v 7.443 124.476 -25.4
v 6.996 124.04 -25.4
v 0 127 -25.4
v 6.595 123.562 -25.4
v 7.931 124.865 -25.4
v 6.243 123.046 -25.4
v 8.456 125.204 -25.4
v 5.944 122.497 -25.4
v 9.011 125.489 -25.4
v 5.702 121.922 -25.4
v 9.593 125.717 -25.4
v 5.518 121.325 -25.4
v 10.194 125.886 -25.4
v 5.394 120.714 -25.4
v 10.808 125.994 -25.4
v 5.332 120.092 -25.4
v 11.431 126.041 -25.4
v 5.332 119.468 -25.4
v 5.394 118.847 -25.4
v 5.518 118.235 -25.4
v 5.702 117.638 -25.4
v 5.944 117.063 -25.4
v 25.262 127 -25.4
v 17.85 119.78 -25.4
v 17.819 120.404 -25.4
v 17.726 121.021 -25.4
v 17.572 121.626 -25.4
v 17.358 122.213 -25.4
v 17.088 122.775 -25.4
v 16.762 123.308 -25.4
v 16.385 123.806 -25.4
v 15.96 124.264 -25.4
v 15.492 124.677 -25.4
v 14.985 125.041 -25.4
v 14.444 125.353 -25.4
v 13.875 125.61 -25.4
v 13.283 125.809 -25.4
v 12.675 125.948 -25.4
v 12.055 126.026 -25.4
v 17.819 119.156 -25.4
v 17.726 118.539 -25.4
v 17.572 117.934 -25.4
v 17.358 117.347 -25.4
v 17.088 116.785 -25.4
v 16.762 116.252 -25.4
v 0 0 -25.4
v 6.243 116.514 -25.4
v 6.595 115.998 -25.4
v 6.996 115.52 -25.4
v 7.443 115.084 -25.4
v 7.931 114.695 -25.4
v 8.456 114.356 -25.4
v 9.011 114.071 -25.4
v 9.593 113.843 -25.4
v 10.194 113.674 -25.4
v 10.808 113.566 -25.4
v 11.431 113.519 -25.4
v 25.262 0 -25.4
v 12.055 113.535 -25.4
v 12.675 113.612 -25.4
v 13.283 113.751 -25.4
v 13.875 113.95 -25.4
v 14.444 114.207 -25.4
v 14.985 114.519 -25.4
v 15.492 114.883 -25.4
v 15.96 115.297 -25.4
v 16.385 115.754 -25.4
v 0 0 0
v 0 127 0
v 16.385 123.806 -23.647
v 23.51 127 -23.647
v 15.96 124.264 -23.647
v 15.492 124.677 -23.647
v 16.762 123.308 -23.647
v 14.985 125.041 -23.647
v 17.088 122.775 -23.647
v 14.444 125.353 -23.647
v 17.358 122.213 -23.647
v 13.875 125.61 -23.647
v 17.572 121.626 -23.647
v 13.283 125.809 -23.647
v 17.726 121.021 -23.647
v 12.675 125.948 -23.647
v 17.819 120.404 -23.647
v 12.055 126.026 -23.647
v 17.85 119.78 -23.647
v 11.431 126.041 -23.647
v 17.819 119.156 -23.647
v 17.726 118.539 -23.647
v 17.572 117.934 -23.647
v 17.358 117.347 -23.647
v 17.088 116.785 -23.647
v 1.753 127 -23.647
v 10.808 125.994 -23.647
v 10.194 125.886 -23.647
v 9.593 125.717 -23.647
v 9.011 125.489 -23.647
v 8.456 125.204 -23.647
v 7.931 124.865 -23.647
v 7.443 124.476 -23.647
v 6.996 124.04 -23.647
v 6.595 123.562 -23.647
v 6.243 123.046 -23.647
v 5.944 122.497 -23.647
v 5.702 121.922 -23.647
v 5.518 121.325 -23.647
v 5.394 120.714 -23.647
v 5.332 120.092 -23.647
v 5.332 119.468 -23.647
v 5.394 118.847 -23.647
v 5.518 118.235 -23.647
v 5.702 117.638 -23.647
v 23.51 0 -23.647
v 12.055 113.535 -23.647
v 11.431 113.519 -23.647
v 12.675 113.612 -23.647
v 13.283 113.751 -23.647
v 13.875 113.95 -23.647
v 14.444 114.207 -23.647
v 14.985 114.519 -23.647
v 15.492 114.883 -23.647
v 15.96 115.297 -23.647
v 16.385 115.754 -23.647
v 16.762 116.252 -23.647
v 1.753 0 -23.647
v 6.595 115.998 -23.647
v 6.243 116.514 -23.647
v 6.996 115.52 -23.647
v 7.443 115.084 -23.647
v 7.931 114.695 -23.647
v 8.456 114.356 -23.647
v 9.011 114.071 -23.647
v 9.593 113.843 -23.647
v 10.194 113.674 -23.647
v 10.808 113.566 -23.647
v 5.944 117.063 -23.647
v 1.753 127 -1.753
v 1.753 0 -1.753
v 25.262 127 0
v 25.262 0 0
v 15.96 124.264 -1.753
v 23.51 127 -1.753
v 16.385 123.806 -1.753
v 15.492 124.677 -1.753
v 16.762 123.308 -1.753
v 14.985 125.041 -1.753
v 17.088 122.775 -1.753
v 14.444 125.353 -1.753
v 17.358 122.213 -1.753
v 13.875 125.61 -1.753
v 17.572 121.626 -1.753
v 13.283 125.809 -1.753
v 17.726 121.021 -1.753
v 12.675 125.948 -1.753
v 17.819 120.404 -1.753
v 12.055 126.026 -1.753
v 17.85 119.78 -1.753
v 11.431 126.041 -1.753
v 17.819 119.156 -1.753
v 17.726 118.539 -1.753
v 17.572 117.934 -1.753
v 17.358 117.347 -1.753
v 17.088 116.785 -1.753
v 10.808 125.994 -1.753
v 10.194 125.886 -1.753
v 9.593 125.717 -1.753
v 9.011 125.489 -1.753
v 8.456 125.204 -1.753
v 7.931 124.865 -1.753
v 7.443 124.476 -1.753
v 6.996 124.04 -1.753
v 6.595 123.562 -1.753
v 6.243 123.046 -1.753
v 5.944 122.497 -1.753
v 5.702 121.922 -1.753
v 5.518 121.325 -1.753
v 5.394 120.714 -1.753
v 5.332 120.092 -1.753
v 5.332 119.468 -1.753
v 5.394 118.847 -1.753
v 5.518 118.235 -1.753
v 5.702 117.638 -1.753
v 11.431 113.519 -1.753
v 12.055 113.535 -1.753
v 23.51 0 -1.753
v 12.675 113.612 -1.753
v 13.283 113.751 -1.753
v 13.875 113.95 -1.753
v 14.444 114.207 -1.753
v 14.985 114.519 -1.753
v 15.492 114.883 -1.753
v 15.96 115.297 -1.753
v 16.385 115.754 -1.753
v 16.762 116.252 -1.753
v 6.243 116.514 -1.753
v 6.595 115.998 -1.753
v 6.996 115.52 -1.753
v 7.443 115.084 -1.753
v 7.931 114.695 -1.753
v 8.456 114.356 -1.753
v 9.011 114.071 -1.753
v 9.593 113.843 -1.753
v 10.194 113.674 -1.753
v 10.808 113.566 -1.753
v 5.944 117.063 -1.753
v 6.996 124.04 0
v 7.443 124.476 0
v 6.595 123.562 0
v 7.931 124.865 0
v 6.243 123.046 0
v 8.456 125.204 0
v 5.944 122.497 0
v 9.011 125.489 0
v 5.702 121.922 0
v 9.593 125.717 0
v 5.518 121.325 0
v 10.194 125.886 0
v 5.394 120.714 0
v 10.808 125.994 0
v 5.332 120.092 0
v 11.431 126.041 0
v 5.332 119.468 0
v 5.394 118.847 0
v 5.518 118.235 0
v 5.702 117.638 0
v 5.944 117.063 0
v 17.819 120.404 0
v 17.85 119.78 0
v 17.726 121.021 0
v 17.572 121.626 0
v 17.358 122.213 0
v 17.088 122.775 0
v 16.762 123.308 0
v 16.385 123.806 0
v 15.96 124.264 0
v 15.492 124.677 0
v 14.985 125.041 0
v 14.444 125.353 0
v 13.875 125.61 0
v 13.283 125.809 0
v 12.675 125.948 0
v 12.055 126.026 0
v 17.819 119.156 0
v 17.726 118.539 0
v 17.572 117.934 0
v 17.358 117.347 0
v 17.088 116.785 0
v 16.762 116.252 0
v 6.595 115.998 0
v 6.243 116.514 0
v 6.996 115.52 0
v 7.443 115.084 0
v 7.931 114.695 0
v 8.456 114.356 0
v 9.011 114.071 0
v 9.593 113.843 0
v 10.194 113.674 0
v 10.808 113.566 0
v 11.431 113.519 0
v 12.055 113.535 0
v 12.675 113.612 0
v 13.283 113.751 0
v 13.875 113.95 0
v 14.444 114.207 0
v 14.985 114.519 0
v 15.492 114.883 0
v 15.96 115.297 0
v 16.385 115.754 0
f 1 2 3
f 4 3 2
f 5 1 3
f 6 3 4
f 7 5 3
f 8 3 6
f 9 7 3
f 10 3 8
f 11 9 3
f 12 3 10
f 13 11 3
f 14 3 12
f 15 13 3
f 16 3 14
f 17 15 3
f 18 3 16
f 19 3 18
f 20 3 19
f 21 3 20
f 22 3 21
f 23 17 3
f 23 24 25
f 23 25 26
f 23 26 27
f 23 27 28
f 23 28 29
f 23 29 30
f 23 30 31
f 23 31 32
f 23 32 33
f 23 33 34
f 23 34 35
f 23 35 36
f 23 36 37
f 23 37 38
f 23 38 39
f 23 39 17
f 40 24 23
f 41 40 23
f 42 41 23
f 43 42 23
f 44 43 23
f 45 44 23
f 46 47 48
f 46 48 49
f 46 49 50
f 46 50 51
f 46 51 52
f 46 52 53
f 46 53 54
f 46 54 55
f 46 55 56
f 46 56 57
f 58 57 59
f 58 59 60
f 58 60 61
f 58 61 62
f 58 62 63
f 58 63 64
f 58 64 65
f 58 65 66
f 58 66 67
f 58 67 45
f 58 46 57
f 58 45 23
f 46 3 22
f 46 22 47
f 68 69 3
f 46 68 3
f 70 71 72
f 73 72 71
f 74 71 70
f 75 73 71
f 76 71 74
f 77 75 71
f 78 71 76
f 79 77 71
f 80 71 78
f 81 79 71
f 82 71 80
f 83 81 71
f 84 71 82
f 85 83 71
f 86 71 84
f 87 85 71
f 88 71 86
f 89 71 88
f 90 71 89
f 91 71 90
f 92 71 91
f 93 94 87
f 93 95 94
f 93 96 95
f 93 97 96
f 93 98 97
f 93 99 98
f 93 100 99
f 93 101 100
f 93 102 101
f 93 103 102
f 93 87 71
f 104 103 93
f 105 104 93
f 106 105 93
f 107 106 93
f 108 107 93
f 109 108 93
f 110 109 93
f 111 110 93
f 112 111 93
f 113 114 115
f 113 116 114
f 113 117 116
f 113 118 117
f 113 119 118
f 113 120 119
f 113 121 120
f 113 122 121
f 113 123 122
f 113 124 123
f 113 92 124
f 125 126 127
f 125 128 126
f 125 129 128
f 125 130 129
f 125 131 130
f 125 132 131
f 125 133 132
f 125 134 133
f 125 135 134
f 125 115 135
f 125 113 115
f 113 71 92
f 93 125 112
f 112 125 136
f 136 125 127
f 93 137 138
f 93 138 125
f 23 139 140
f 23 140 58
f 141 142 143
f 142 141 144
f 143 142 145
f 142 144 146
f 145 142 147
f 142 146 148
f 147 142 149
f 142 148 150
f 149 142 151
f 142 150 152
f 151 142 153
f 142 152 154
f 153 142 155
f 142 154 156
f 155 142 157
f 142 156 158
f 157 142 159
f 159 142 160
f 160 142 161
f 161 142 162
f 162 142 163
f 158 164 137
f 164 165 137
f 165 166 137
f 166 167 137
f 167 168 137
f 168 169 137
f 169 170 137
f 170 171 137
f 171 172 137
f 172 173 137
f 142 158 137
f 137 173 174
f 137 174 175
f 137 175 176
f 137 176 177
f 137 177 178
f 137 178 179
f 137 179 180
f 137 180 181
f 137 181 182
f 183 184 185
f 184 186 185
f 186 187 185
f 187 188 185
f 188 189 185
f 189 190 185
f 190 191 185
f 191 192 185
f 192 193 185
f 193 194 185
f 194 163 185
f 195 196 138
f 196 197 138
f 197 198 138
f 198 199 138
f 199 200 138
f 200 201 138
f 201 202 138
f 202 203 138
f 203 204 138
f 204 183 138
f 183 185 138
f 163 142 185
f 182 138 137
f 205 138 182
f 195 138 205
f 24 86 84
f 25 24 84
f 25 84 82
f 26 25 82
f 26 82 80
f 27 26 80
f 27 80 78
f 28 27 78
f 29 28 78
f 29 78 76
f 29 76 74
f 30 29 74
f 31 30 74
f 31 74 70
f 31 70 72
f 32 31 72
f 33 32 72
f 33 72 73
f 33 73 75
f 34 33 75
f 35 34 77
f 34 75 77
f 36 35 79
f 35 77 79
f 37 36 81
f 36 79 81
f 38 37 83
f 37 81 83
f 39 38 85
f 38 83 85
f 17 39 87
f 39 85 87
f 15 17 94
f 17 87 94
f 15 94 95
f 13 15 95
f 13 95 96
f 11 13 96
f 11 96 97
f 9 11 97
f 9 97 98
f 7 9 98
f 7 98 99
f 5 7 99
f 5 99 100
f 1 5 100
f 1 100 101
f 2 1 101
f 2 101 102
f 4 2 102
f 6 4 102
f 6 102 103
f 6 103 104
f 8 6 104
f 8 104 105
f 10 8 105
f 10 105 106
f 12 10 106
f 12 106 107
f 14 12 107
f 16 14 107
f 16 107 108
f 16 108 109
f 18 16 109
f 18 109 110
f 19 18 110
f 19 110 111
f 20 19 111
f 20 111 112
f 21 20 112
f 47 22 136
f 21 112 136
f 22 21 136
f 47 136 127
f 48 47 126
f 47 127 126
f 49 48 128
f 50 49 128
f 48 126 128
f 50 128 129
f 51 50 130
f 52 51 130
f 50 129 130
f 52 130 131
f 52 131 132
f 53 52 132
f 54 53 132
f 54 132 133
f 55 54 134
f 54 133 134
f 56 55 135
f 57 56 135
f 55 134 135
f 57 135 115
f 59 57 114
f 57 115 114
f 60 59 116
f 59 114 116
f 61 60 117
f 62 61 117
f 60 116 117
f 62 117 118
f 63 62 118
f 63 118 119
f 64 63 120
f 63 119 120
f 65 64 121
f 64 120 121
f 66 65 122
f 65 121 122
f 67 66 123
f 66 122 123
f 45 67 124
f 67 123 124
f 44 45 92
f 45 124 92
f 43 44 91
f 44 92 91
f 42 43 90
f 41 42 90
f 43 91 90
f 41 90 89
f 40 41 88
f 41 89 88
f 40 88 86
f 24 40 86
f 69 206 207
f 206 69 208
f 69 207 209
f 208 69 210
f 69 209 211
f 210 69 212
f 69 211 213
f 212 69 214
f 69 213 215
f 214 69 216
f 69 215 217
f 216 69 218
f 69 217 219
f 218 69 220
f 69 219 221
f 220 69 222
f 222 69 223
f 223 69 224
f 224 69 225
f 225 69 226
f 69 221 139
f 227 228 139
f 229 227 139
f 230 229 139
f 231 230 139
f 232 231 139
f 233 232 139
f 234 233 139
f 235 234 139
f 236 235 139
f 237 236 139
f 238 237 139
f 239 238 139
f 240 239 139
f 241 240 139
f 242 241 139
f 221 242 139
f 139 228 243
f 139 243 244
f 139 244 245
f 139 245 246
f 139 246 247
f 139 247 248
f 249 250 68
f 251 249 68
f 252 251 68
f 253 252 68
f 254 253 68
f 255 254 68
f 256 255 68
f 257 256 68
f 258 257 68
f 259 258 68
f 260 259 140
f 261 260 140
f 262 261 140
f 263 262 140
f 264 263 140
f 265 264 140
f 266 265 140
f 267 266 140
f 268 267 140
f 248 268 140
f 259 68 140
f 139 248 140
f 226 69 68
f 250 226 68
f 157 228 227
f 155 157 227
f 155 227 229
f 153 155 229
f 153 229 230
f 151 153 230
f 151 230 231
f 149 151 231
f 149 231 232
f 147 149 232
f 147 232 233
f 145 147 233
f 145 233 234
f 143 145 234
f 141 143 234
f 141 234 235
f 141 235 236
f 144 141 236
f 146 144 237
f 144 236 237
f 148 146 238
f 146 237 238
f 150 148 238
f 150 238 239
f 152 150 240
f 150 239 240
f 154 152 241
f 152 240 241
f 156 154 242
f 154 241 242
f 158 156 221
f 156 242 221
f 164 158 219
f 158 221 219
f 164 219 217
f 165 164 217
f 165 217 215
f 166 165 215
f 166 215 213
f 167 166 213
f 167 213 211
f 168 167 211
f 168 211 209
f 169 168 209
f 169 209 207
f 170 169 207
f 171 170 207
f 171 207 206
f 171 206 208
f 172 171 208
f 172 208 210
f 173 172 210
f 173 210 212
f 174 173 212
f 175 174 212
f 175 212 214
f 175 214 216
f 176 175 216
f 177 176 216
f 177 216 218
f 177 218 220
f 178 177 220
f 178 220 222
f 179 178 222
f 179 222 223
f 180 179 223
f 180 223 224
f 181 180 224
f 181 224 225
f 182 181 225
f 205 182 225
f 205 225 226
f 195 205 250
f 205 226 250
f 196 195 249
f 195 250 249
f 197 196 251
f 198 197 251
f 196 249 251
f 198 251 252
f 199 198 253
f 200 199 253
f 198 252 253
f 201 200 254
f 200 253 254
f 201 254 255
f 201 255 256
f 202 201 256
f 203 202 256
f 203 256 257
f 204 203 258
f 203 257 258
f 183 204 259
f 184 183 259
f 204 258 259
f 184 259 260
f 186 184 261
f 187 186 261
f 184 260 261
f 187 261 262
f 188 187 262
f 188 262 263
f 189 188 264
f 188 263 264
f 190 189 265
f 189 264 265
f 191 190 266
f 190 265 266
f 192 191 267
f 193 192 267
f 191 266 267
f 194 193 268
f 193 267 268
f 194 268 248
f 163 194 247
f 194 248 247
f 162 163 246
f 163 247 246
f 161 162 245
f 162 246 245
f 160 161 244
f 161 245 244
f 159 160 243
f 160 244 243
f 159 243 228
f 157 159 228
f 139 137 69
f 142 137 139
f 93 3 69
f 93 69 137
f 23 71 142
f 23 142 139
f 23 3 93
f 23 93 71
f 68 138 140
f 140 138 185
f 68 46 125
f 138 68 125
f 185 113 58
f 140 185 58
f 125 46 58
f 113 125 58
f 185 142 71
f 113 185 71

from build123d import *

# Parameters (mm, degrees)
SKETCH6_W           = 25.262112462
SKETCH6_H           = 25.4
BOSS_EXTRUDE3_DEPTH = 127
SKETCH8_R           = 6.263004549
CUT_EXTRUDE1_DEPTH  = 25.4
SKETCH9_W           = 21.756912462
SKETCH9_H           = 21.8948
CUT_EXTRUDE2_DEPTH  = 127


with BuildPart() as part:
    # Sketch6 → Boss-Extrude3 (new body)
    with BuildSketch(Plane(origin=(0, 0, 0), x_dir=(1, 0, 0), z_dir=(0, 1, 0))):
        with Locations((12.631056231, 12.7)):
            Rectangle(SKETCH6_W, SKETCH6_H)
    extrude(amount=BOSS_EXTRUDE3_DEPTH)

    # Sketch8 → Cut-Extrude1 (cut)
    with BuildSketch(Plane.XY):
        with Locations((11.587222139, 119.780054764)):
            Circle(SKETCH8_R)
    extrude(amount=-CUT_EXTRUDE1_DEPTH, mode=Mode.SUBTRACT)

    # Sketch9 → Cut-Extrude2 (cut)
    with BuildSketch(Plane(origin=(0, 0, 0), x_dir=(-1, 0, 0), z_dir=(0, -1, 0))):
        with Locations((-12.631056231, 12.7)):
            Rectangle(SKETCH9_W, SKETCH9_H)
    extrude(amount=-CUT_EXTRUDE2_DEPTH, mode=Mode.SUBTRACT)


solid = part.part
